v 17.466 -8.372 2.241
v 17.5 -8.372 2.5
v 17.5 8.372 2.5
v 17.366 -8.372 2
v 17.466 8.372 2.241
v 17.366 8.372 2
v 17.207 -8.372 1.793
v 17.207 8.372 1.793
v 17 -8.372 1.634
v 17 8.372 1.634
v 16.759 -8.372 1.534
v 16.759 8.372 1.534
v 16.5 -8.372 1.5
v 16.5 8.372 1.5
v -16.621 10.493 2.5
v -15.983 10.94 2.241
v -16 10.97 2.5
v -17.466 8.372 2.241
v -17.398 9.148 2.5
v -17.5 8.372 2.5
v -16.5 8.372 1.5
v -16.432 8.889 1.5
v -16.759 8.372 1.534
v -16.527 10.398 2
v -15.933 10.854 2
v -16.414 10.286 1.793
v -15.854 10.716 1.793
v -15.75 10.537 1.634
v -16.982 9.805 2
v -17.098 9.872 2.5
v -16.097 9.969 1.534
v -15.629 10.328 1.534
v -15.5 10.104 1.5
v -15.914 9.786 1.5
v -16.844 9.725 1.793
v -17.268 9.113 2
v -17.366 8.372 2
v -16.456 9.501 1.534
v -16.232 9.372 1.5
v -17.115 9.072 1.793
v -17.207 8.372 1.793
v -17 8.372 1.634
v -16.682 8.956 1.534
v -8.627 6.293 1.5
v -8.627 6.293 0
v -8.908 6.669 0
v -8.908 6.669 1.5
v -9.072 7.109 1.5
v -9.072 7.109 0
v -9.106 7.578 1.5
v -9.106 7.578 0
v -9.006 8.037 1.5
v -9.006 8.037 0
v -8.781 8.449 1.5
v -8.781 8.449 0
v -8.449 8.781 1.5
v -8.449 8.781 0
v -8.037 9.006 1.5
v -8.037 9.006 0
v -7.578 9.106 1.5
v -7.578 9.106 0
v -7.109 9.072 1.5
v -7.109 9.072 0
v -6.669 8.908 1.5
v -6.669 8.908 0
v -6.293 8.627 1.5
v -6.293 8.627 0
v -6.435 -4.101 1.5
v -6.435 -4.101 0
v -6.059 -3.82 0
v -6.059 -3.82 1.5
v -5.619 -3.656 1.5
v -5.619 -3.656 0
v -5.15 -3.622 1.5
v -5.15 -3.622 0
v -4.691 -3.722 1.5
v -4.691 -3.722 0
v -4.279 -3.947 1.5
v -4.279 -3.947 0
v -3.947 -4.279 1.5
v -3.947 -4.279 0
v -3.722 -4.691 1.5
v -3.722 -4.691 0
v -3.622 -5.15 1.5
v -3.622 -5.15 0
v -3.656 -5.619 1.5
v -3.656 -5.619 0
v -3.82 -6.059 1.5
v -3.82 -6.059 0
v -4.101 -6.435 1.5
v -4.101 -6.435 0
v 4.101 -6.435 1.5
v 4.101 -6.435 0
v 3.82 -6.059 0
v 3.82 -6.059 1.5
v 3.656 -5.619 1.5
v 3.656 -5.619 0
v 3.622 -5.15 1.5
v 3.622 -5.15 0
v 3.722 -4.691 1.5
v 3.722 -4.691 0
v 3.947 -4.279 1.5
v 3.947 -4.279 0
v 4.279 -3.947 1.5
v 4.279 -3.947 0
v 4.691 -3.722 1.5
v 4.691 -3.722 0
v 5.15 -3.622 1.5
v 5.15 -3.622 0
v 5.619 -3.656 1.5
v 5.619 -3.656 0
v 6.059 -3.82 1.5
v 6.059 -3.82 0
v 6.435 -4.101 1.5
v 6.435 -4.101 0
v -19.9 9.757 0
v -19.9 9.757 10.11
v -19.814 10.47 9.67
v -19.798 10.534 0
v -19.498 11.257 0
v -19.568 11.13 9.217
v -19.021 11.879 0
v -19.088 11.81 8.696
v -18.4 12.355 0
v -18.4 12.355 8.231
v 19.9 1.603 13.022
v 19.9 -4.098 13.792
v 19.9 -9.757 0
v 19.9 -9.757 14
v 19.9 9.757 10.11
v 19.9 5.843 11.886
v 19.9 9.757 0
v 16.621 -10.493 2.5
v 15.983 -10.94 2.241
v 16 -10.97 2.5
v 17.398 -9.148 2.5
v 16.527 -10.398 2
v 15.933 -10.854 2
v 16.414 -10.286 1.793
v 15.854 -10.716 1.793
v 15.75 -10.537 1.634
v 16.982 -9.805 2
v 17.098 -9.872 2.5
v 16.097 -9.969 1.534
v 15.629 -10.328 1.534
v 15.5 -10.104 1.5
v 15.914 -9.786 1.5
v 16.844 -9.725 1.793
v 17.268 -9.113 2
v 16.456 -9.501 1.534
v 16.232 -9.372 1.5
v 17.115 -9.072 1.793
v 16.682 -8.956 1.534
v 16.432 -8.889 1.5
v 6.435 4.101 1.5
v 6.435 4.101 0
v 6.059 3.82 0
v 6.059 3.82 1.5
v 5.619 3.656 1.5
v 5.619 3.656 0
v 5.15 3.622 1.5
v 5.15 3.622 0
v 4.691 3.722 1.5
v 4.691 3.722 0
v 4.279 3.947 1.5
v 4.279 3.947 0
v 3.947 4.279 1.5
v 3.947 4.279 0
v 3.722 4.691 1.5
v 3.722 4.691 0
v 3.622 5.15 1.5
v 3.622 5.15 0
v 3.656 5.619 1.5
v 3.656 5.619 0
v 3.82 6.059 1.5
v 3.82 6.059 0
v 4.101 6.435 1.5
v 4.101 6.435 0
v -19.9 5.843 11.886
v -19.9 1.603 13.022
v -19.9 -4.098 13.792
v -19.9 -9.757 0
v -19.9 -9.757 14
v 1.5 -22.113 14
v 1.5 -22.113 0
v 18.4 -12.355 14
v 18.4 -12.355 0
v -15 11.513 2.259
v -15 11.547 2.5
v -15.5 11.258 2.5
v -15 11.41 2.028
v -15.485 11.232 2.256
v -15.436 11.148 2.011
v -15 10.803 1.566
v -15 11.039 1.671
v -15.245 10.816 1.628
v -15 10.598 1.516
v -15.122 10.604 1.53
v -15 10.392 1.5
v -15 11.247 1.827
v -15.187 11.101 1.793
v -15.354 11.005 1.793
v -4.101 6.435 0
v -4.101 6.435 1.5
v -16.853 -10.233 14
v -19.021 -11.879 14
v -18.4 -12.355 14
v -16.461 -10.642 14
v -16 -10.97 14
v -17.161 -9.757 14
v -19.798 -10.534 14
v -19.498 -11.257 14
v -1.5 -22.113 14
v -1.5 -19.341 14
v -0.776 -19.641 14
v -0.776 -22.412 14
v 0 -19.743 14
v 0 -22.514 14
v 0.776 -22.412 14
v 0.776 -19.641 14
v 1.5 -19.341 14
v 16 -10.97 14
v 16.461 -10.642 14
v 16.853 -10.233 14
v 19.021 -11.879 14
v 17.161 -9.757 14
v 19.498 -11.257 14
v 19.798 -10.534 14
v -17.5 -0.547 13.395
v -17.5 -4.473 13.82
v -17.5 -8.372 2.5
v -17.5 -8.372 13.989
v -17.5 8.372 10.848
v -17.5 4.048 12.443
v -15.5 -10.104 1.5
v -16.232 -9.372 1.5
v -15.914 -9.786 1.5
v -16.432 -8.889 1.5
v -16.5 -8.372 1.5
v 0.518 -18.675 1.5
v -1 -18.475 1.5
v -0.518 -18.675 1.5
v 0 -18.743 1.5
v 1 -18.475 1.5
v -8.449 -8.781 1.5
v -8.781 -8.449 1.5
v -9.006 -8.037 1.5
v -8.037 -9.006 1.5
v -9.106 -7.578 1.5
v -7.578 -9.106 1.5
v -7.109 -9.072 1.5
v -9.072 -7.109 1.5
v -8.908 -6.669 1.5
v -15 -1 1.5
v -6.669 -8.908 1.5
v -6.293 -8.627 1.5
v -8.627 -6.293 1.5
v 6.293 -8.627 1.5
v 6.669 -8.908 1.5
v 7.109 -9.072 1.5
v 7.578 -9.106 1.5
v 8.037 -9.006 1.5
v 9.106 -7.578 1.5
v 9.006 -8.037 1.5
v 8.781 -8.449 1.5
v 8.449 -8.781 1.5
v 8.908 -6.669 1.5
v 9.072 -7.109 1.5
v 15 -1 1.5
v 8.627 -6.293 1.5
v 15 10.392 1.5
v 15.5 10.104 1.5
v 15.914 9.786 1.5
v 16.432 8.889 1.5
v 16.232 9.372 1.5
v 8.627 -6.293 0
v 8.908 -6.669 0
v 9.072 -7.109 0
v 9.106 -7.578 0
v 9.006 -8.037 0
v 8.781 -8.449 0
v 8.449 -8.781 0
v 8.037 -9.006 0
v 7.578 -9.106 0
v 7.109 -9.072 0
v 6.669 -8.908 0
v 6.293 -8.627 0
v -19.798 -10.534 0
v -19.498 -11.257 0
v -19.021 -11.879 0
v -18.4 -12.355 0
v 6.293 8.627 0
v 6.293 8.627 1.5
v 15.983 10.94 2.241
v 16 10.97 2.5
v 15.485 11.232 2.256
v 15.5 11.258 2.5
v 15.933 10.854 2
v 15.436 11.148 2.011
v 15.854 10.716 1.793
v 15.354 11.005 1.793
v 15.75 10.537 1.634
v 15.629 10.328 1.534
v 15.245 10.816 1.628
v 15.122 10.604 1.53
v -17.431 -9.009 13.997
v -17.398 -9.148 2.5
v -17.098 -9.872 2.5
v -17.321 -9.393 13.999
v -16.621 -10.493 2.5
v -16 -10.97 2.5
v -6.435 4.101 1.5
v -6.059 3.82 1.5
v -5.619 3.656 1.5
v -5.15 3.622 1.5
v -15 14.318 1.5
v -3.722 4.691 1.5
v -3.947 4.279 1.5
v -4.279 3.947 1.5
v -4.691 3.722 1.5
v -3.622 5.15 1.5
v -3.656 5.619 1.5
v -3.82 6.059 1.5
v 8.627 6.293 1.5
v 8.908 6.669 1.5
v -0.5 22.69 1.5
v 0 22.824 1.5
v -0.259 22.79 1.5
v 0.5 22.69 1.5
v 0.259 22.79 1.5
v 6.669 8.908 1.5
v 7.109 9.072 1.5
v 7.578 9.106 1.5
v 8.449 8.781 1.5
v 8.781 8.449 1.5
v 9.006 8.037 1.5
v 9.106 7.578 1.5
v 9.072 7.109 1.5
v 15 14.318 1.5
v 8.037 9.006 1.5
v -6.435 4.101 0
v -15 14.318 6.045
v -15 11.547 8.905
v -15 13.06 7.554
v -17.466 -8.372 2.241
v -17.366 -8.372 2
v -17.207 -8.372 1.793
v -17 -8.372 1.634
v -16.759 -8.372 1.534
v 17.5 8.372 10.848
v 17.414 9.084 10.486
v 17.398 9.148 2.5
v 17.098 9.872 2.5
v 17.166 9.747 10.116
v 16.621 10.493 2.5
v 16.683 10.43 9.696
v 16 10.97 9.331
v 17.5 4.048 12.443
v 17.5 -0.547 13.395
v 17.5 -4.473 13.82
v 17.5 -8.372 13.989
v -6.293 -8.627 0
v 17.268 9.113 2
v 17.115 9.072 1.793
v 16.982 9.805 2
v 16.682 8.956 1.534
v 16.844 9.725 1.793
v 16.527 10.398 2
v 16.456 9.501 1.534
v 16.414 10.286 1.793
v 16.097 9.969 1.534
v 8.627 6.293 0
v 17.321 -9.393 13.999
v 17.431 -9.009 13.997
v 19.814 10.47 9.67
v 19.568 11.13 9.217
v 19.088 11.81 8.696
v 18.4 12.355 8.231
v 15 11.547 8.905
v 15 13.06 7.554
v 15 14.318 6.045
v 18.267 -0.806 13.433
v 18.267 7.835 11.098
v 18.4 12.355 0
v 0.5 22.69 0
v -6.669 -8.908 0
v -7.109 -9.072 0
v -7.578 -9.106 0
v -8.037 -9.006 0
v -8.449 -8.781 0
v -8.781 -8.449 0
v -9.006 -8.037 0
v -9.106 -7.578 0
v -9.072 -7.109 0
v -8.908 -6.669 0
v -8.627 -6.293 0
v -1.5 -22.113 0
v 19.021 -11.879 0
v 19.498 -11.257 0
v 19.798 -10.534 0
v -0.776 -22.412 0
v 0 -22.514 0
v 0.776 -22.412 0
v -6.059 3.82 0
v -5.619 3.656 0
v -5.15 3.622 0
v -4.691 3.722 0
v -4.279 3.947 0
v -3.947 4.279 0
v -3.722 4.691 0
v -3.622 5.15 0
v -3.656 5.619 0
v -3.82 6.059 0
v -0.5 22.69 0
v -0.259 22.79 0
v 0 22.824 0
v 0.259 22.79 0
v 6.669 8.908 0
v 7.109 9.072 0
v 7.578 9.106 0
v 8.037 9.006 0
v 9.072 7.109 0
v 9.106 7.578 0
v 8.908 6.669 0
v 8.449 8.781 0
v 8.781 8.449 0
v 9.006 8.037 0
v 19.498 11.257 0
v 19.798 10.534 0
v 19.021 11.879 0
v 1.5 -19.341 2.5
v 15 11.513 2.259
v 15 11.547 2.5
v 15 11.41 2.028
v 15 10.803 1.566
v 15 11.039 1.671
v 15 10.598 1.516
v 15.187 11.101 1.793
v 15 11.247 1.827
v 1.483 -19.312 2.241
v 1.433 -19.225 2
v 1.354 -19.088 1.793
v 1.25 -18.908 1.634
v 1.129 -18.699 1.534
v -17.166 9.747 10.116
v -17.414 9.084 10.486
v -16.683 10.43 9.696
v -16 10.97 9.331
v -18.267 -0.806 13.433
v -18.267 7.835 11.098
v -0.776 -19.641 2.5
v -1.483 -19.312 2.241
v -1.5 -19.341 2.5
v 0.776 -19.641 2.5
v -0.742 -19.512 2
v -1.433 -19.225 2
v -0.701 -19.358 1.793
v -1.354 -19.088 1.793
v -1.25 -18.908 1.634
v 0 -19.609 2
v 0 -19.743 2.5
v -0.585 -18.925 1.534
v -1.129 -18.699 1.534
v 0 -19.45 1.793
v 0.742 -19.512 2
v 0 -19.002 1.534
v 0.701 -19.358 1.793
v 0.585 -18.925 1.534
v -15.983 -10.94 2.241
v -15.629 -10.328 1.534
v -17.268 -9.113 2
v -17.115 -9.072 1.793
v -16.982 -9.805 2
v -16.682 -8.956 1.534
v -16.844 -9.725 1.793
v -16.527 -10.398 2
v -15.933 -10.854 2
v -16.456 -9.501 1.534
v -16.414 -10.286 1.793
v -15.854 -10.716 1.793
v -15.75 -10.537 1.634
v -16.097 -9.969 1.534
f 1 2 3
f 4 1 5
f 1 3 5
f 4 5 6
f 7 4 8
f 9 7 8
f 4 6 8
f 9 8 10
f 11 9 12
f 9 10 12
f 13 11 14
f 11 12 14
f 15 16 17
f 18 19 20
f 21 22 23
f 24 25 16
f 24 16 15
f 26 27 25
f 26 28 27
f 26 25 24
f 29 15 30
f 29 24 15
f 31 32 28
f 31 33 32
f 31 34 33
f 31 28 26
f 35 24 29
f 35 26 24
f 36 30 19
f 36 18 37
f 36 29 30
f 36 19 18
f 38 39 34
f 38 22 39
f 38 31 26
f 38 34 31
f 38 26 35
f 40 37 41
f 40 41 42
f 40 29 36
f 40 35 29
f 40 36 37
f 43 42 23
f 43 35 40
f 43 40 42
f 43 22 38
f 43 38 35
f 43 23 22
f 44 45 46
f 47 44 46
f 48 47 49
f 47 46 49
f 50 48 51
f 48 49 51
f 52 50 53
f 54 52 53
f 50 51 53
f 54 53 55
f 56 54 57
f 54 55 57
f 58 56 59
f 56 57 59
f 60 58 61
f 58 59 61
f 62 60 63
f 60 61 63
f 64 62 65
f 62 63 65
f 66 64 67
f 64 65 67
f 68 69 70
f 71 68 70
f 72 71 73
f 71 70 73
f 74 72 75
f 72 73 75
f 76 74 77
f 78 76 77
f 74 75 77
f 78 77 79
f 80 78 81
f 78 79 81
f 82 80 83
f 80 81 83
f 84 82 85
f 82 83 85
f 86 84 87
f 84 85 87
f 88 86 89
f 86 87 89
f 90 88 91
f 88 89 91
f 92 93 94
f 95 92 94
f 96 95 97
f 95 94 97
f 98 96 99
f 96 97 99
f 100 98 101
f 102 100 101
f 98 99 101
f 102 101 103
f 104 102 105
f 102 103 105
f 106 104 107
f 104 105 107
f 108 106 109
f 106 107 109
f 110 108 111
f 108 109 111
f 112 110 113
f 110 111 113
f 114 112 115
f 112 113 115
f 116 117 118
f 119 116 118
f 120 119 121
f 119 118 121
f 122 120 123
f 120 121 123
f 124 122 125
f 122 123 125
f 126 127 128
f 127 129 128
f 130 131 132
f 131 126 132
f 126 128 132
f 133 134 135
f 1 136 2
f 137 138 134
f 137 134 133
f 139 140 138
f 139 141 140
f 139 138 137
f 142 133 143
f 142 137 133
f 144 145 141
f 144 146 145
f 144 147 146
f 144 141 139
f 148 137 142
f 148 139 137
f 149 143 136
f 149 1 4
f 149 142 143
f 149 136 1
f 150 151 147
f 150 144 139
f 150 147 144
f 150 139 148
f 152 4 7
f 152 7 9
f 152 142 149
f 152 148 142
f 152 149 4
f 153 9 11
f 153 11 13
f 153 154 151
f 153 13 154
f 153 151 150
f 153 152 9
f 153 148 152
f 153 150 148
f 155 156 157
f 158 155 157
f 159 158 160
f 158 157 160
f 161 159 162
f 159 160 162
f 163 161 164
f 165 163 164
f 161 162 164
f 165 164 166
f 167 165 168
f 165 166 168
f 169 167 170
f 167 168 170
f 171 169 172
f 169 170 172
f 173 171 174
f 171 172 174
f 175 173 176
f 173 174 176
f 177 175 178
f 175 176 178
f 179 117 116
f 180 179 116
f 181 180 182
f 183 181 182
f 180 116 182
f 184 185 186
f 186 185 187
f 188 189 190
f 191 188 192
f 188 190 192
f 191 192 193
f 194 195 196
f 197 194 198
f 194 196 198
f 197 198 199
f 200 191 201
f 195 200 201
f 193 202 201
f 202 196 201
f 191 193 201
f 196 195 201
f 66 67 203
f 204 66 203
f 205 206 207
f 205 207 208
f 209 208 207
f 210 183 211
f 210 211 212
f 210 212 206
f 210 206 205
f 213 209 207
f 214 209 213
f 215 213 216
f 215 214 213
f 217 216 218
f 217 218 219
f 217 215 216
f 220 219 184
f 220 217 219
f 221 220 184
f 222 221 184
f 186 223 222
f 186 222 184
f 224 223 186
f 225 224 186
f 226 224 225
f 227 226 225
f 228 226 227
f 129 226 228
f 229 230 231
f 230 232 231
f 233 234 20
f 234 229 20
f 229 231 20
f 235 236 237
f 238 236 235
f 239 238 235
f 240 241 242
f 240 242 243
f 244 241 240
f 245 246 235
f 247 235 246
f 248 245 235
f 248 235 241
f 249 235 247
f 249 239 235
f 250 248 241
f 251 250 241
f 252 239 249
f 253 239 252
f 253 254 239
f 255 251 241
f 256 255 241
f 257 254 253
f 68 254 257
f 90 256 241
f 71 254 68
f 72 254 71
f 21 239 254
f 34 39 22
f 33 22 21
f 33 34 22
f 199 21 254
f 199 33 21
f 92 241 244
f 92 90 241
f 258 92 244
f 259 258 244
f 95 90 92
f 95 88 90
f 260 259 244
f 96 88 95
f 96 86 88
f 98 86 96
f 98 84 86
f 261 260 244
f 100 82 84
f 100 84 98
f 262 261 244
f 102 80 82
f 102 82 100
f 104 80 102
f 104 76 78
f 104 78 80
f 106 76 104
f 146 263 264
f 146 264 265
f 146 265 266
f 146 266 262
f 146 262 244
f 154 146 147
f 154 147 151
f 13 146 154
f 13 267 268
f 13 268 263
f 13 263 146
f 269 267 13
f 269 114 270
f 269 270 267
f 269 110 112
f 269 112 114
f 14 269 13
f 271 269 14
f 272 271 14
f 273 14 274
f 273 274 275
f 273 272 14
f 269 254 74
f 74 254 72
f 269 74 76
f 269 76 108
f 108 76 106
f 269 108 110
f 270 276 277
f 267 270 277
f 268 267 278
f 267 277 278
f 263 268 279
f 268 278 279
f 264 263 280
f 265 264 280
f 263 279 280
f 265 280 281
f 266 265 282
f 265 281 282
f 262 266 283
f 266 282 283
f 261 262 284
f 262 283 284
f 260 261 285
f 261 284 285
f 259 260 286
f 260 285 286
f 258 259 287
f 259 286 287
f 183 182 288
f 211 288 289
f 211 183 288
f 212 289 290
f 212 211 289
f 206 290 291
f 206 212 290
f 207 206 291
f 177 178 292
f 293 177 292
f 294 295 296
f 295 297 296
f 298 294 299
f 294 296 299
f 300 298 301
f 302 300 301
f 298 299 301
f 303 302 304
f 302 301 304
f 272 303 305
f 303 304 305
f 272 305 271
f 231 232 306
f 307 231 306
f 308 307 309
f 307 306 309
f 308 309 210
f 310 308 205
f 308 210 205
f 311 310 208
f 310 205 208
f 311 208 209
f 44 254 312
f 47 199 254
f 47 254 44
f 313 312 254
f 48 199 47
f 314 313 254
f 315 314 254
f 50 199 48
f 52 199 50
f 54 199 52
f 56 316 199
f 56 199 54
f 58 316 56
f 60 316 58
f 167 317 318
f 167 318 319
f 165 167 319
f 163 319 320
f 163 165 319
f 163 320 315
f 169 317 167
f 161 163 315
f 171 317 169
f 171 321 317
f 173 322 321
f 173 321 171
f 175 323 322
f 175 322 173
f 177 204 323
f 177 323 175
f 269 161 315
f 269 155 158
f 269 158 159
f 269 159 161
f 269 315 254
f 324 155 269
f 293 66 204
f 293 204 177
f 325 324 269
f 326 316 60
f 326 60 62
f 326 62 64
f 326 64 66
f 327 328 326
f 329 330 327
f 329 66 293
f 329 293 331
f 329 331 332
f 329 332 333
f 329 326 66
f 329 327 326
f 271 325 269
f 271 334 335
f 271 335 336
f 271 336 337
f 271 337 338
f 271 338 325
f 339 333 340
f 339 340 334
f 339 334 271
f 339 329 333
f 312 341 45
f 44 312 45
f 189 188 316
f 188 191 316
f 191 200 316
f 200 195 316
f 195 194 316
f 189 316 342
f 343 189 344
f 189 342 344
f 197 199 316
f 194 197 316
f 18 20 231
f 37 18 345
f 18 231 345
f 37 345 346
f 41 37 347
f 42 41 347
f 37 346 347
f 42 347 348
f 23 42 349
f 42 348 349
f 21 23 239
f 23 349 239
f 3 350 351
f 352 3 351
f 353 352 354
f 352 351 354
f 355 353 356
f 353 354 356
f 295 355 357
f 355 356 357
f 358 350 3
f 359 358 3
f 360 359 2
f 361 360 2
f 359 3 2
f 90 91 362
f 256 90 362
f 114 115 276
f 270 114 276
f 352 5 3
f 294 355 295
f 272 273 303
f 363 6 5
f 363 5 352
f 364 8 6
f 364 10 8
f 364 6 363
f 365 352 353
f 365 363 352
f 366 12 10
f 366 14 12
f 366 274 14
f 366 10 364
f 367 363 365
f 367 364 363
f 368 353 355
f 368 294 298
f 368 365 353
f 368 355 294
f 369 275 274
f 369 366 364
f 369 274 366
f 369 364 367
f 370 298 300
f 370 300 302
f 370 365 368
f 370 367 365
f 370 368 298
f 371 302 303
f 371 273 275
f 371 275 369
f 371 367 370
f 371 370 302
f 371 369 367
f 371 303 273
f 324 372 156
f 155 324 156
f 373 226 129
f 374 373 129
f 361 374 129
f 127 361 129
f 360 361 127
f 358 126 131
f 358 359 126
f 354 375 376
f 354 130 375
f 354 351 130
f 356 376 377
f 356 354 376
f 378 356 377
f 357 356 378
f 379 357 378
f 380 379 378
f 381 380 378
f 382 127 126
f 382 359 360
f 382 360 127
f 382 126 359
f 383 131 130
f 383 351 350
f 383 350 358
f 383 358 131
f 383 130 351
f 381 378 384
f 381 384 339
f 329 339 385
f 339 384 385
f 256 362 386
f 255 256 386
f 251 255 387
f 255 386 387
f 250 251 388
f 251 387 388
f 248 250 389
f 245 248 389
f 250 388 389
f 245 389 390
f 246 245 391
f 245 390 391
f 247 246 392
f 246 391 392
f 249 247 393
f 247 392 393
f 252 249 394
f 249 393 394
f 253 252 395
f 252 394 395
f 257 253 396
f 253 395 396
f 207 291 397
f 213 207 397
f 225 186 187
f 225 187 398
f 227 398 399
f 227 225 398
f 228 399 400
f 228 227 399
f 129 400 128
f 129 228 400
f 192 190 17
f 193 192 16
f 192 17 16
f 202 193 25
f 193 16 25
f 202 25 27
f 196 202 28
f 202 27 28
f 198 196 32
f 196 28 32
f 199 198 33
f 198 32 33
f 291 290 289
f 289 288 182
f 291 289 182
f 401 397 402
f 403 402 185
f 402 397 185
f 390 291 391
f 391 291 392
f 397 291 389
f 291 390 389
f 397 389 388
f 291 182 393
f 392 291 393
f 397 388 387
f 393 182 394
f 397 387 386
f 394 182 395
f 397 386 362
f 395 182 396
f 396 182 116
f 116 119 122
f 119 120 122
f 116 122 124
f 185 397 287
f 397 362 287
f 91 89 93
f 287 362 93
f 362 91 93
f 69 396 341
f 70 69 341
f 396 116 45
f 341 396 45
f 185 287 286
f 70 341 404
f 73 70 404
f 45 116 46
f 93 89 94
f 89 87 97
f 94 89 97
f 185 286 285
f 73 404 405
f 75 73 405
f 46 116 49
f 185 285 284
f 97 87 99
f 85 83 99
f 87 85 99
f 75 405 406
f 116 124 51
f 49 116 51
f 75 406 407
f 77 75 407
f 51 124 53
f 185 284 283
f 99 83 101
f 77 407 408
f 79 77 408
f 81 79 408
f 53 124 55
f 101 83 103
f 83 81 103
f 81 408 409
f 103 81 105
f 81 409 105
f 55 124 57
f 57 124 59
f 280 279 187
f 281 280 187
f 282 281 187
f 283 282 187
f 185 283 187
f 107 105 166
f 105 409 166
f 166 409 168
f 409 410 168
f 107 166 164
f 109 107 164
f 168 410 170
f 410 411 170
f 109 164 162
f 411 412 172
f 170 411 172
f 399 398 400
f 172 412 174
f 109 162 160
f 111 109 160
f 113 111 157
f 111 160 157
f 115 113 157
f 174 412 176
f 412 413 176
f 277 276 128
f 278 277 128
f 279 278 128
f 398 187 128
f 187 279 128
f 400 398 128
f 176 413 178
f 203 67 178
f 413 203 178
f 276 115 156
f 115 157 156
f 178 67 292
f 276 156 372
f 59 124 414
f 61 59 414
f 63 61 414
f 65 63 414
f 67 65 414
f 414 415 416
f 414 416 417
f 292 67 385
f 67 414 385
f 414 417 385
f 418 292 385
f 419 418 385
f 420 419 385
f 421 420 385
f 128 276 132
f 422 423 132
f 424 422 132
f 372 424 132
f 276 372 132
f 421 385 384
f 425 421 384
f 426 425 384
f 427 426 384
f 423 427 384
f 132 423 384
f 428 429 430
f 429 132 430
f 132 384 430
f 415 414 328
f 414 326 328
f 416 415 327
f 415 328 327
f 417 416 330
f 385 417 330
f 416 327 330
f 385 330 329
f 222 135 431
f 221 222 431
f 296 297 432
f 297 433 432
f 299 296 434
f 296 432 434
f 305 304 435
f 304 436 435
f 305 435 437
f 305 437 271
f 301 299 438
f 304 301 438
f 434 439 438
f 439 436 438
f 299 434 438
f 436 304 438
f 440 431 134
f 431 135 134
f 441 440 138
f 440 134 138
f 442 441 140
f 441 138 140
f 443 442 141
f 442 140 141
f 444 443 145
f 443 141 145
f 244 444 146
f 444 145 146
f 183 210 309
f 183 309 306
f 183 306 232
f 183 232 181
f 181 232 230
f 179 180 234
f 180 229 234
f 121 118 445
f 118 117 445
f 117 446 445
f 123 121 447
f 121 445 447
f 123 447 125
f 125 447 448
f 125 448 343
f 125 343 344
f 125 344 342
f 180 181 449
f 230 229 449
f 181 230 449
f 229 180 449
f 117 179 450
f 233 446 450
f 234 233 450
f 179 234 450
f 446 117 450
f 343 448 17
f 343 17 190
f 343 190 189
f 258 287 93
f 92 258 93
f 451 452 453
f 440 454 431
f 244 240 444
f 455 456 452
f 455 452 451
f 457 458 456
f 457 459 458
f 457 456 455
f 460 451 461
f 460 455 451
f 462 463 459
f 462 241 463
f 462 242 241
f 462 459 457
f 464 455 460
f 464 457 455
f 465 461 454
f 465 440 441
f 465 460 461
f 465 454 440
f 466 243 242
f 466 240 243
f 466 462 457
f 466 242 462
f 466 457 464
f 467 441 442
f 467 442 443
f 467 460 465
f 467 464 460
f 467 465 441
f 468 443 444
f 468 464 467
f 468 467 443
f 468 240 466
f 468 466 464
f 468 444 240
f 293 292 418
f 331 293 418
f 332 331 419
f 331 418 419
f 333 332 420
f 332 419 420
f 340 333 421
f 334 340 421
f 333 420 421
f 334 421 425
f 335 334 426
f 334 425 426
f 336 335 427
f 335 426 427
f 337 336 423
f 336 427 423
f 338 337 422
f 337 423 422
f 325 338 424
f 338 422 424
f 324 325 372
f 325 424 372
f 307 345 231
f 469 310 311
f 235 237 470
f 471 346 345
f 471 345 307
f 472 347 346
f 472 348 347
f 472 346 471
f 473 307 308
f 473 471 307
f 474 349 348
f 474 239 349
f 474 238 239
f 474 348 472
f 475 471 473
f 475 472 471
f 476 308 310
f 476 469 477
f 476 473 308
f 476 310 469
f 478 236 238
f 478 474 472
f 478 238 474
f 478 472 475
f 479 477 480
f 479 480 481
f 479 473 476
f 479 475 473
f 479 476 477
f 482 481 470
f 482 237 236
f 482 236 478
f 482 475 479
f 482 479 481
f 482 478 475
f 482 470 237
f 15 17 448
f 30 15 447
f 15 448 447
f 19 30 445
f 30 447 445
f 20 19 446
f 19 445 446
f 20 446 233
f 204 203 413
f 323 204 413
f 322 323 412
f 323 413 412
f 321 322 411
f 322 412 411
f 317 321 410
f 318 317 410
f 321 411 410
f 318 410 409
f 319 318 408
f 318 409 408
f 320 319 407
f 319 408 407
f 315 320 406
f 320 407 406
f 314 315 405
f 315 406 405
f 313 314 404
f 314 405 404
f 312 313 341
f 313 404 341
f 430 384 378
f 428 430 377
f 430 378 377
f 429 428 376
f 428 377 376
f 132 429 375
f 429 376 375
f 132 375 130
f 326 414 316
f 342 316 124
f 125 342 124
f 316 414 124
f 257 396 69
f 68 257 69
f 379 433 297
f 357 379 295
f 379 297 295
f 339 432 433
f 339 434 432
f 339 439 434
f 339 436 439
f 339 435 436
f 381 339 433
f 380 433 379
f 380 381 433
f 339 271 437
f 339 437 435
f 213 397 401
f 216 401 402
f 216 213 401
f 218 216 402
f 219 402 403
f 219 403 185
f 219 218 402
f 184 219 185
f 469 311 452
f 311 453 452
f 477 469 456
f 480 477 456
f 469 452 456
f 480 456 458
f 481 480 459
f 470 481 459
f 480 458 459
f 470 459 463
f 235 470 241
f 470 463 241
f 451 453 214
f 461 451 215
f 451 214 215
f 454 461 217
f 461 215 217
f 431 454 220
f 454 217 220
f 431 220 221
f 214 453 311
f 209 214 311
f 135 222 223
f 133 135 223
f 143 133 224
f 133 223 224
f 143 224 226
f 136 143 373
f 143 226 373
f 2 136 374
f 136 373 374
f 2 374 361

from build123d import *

# Parameters (mm, degrees)
F1_DEPTH = 1.5
F2_DEPTH = 14
F4_W     = 30
F4_H     = 17.707149
F5_DEPTH = 26
F6_R     = 3
F7_R     = 1
F9_DEPTH = 21.8


with BuildPart() as f1:
    # F0 (on Top) → F1 (new body)
    with BuildSketch(Plane.XY):
        Polygon((0, -20.207259), (17.5, -10.10363), (17.5, 10.10363), (0, 20.207259), (-17.5, 10.10363), (-17.5, -10.10363), align=None)
        with BuildLine():
            ThreePointArc((-6.29325, -8.626703), (-8.626703, -8.626703), (-8.626703, -6.29325))
            Line((-8.626703, -6.29325), (-6.434672, -4.101219))
            ThreePointArc((-6.434672, -4.101219), (-4.101219, -4.101219), (-4.101219, -6.434672))
            Line((-4.101219, -6.434672), (-6.29325, -8.626703))
        make_face(mode=Mode.SUBTRACT)
        with BuildLine():
            ThreePointArc((8.626703, -6.29325), (8.626703, -8.626703), (6.29325, -8.626703))
            Line((6.29325, -8.626703), (4.101219, -6.434672))
            ThreePointArc((4.101219, -6.434672), (4.101219, -4.101219), (6.434672, -4.101219))
            Line((6.434672, -4.101219), (8.626703, -6.29325))
        make_face(mode=Mode.SUBTRACT)
        with BuildLine():
            ThreePointArc((-8.626703, 6.29325), (-8.626703, 8.626703), (-6.29325, 8.626703))
            Line((-6.29325, 8.626703), (-4.101219, 6.434672))
            ThreePointArc((-4.101219, 6.434672), (-4.101219, 4.101219), (-6.434672, 4.101219))
            Line((-6.434672, 4.101219), (-8.626703, 6.29325))
        make_face(mode=Mode.SUBTRACT)
        with BuildLine():
            Line((4.101219, 6.434672), (6.29325, 8.626703))
            ThreePointArc((6.29325, 8.626703), (8.626703, 8.626703), (8.626703, 6.29325))
            Line((8.626703, 6.29325), (6.434672, 4.101219))
            ThreePointArc((6.434672, 4.101219), (4.101219, 4.101219), (4.101219, 6.434672))
        make_face(mode=Mode.SUBTRACT)
    extrude(amount=F1_DEPTH)

    # F0 (on Top) → F2 (join)
    with BuildSketch(Plane.XY):
        Polygon((-19.9, 11.48927), (-19.9, -11.48927), (0, -22.978541), (19.9, -11.48927), (19.9, 11.48927), (0, 22.978541), align=None)
        Polygon((17.5, 10.10363), (17.5, -10.10363), (0, -20.207259), (-17.5, -10.10363), (-17.5, 10.10363), (0, 20.207259), align=None, mode=Mode.SUBTRACT)
    extrude(amount=F2_DEPTH)

    # F4 (on offset) → F5 (cut)
    with BuildSketch(Plane.XZ.offset(-25)):
        with Locations((0, 10.353574)):
            Rectangle(F4_W, F4_H)
    extrude(amount=F5_DEPTH, mode=Mode.SUBTRACT)

    # F6
    f6_edges = [f1.edges().sort_by_distance(p)[0] for p in [
        (19.9, 11.48927, 7),
        (-19.9, 11.48927, 7),
        (-19.9, -11.48927, 7),
        (0, -22.978541, 7),
        (19.9, -11.48927, 7),
        (17.5, 10.10363, 7.75),
        (17.5, -10.10363, 7.75),
        (0, -20.207259, 7.75),
        (-17.5, -10.10363, 7.75),
        (-17.5, 10.10363, 7.75),
    ]]
    fillet(f6_edges, radius=F6_R)

    # F7
    f7_edges = [f1.edges().sort_by_distance(p)[0] for p in [
        (-15.5, 11.25833, 1.5),
        (0, 22.978541, 0.75),
    ]]
    fillet(f7_edges, radius=F7_R)

    # F8 (on Right) → F9 (cut, symmetric)
    with BuildSketch(Plane.YZ):
        with BuildLine():
            Line((14.684951, 14), (-9.75722, 14))
            add(Edge.make_bspline(
                [(-9.75722, 14), (-1.043614, 14), (10.101545, 12.707566), (14.684951, 5.5)],
                knots=[0, 0, 0, 0, 25.877977, 25.877977, 25.877977, 25.877977], degree=3))
            Line((14.684951, 5.5), (14.684951, 14))
        make_face()
    extrude(amount=F9_DEPTH, both=True, mode=Mode.SUBTRACT)


solid = f1.part
